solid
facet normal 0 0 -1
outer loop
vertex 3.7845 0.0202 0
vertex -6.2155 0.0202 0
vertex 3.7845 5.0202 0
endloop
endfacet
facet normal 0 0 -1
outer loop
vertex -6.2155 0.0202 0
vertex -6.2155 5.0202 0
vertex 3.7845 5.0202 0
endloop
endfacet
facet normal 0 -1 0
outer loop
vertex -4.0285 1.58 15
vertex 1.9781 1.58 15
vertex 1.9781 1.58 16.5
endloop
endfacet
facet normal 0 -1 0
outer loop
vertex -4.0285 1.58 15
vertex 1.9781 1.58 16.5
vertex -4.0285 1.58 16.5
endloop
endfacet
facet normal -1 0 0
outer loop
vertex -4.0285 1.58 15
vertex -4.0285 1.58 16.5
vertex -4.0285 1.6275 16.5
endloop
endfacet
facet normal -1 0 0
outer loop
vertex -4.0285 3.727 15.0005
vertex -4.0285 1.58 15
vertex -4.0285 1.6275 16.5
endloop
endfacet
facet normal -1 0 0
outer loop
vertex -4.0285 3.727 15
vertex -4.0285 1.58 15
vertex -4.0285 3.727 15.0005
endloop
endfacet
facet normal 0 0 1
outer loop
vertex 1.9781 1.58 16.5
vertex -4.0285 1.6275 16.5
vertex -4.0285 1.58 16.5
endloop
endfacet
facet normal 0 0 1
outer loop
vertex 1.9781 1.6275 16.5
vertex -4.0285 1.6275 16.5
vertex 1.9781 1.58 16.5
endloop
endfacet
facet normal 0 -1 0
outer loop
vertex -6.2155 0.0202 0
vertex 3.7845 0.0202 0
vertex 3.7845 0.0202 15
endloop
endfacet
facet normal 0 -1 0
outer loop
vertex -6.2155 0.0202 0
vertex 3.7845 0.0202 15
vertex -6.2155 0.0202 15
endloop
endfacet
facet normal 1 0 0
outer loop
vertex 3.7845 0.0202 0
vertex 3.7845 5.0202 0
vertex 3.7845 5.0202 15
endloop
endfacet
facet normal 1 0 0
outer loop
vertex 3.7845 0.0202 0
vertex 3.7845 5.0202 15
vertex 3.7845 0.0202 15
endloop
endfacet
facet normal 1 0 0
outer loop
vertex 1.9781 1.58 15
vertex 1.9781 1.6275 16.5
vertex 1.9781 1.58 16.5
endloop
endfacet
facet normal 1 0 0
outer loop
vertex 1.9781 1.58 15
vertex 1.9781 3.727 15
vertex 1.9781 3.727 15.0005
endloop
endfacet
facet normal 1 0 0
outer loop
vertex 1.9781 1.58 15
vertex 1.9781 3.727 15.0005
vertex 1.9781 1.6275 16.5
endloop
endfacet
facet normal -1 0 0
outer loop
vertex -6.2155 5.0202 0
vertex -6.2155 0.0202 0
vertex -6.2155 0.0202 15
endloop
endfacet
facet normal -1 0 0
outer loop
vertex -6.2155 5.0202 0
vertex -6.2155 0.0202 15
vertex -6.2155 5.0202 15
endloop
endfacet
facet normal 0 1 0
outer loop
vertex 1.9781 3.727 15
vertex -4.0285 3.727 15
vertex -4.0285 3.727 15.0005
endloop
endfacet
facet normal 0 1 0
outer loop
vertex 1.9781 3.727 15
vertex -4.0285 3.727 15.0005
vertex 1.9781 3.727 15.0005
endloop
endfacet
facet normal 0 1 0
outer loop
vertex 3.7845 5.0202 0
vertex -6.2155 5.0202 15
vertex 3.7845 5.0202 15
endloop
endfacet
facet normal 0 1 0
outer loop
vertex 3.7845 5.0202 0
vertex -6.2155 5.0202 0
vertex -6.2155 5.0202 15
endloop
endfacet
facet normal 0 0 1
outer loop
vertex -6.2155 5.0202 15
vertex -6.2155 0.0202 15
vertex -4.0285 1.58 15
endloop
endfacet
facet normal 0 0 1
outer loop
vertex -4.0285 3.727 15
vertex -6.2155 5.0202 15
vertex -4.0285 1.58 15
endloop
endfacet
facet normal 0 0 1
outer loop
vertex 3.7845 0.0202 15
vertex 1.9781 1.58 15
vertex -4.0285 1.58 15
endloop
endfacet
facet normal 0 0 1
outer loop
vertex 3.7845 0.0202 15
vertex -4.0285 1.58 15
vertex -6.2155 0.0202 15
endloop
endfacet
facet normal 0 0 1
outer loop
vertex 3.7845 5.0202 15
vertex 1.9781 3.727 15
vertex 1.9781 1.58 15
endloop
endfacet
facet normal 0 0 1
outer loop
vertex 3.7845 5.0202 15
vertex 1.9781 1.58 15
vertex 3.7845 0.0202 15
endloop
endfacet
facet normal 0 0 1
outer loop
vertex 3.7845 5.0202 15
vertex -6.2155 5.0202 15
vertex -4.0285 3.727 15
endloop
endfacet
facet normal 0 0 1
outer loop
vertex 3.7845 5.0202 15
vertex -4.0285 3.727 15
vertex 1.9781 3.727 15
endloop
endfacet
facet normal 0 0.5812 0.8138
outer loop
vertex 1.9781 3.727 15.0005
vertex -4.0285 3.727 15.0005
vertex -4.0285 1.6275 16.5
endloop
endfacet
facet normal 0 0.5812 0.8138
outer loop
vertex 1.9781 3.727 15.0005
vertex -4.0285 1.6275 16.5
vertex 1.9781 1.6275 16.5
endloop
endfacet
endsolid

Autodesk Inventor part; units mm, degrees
ref_plane "YZ Plane" through (0, 0, 0) normal (1, 0, 0) x (0, 1, 0)
ref_plane "XZ Plane" through (0, 0, 0) normal (0, 1, 0) x (-1, 0, 0)
ref_plane "XY Plane" through (0, 0, 0) normal (0, 0, 1) x (1, 0, 0)
sketch "Sketch1" plane through (0, 0, 0) normal (0, 0, 1) x (1, 0, 0)
  line L0 (-6.2155, 5.0202) -> (3.7845, 5.0202)
  line L1 (3.7845, 5.0202) -> (3.7845, 0.0202)
  line L2 (3.7845, 0.0202) -> (-6.2155, 0.0202)
  line L3 (-6.2155, 0.0202) -> (-6.2155, 5.0202)
  point P0 (0, 0)
  dimension "d0" = 10
  dimension "d1" = 5
extrude "Extrusion1" add sketch "Sketch1" along normal blind 15
sketch "Sketch2" plane through (0, 0, 15) normal (0, 0, 1) x (1, 0, 0)
  line L0 (-4.0285, 3.727) -> (1.9781, 3.727)
  line L1 (1.9781, 3.727) -> (1.9781, 1.58)
  line L2 (1.9781, 1.58) -> (-4.0285, 1.58)
  line L3 (-4.0285, 1.58) -> (-4.0285, 3.727)
  point P0 (0, 0)
extrude "Extrusion2" add sketch "Sketch2" along normal blind 1.5
chamfer "Chamfer1" distance 2.1 distance2 1.5 1 edges at (-1.0252, 3.727, 16.5) measured on face at (-2.0263, 3.0113, 16.5)
properties part number "cutter grp 17-1"
